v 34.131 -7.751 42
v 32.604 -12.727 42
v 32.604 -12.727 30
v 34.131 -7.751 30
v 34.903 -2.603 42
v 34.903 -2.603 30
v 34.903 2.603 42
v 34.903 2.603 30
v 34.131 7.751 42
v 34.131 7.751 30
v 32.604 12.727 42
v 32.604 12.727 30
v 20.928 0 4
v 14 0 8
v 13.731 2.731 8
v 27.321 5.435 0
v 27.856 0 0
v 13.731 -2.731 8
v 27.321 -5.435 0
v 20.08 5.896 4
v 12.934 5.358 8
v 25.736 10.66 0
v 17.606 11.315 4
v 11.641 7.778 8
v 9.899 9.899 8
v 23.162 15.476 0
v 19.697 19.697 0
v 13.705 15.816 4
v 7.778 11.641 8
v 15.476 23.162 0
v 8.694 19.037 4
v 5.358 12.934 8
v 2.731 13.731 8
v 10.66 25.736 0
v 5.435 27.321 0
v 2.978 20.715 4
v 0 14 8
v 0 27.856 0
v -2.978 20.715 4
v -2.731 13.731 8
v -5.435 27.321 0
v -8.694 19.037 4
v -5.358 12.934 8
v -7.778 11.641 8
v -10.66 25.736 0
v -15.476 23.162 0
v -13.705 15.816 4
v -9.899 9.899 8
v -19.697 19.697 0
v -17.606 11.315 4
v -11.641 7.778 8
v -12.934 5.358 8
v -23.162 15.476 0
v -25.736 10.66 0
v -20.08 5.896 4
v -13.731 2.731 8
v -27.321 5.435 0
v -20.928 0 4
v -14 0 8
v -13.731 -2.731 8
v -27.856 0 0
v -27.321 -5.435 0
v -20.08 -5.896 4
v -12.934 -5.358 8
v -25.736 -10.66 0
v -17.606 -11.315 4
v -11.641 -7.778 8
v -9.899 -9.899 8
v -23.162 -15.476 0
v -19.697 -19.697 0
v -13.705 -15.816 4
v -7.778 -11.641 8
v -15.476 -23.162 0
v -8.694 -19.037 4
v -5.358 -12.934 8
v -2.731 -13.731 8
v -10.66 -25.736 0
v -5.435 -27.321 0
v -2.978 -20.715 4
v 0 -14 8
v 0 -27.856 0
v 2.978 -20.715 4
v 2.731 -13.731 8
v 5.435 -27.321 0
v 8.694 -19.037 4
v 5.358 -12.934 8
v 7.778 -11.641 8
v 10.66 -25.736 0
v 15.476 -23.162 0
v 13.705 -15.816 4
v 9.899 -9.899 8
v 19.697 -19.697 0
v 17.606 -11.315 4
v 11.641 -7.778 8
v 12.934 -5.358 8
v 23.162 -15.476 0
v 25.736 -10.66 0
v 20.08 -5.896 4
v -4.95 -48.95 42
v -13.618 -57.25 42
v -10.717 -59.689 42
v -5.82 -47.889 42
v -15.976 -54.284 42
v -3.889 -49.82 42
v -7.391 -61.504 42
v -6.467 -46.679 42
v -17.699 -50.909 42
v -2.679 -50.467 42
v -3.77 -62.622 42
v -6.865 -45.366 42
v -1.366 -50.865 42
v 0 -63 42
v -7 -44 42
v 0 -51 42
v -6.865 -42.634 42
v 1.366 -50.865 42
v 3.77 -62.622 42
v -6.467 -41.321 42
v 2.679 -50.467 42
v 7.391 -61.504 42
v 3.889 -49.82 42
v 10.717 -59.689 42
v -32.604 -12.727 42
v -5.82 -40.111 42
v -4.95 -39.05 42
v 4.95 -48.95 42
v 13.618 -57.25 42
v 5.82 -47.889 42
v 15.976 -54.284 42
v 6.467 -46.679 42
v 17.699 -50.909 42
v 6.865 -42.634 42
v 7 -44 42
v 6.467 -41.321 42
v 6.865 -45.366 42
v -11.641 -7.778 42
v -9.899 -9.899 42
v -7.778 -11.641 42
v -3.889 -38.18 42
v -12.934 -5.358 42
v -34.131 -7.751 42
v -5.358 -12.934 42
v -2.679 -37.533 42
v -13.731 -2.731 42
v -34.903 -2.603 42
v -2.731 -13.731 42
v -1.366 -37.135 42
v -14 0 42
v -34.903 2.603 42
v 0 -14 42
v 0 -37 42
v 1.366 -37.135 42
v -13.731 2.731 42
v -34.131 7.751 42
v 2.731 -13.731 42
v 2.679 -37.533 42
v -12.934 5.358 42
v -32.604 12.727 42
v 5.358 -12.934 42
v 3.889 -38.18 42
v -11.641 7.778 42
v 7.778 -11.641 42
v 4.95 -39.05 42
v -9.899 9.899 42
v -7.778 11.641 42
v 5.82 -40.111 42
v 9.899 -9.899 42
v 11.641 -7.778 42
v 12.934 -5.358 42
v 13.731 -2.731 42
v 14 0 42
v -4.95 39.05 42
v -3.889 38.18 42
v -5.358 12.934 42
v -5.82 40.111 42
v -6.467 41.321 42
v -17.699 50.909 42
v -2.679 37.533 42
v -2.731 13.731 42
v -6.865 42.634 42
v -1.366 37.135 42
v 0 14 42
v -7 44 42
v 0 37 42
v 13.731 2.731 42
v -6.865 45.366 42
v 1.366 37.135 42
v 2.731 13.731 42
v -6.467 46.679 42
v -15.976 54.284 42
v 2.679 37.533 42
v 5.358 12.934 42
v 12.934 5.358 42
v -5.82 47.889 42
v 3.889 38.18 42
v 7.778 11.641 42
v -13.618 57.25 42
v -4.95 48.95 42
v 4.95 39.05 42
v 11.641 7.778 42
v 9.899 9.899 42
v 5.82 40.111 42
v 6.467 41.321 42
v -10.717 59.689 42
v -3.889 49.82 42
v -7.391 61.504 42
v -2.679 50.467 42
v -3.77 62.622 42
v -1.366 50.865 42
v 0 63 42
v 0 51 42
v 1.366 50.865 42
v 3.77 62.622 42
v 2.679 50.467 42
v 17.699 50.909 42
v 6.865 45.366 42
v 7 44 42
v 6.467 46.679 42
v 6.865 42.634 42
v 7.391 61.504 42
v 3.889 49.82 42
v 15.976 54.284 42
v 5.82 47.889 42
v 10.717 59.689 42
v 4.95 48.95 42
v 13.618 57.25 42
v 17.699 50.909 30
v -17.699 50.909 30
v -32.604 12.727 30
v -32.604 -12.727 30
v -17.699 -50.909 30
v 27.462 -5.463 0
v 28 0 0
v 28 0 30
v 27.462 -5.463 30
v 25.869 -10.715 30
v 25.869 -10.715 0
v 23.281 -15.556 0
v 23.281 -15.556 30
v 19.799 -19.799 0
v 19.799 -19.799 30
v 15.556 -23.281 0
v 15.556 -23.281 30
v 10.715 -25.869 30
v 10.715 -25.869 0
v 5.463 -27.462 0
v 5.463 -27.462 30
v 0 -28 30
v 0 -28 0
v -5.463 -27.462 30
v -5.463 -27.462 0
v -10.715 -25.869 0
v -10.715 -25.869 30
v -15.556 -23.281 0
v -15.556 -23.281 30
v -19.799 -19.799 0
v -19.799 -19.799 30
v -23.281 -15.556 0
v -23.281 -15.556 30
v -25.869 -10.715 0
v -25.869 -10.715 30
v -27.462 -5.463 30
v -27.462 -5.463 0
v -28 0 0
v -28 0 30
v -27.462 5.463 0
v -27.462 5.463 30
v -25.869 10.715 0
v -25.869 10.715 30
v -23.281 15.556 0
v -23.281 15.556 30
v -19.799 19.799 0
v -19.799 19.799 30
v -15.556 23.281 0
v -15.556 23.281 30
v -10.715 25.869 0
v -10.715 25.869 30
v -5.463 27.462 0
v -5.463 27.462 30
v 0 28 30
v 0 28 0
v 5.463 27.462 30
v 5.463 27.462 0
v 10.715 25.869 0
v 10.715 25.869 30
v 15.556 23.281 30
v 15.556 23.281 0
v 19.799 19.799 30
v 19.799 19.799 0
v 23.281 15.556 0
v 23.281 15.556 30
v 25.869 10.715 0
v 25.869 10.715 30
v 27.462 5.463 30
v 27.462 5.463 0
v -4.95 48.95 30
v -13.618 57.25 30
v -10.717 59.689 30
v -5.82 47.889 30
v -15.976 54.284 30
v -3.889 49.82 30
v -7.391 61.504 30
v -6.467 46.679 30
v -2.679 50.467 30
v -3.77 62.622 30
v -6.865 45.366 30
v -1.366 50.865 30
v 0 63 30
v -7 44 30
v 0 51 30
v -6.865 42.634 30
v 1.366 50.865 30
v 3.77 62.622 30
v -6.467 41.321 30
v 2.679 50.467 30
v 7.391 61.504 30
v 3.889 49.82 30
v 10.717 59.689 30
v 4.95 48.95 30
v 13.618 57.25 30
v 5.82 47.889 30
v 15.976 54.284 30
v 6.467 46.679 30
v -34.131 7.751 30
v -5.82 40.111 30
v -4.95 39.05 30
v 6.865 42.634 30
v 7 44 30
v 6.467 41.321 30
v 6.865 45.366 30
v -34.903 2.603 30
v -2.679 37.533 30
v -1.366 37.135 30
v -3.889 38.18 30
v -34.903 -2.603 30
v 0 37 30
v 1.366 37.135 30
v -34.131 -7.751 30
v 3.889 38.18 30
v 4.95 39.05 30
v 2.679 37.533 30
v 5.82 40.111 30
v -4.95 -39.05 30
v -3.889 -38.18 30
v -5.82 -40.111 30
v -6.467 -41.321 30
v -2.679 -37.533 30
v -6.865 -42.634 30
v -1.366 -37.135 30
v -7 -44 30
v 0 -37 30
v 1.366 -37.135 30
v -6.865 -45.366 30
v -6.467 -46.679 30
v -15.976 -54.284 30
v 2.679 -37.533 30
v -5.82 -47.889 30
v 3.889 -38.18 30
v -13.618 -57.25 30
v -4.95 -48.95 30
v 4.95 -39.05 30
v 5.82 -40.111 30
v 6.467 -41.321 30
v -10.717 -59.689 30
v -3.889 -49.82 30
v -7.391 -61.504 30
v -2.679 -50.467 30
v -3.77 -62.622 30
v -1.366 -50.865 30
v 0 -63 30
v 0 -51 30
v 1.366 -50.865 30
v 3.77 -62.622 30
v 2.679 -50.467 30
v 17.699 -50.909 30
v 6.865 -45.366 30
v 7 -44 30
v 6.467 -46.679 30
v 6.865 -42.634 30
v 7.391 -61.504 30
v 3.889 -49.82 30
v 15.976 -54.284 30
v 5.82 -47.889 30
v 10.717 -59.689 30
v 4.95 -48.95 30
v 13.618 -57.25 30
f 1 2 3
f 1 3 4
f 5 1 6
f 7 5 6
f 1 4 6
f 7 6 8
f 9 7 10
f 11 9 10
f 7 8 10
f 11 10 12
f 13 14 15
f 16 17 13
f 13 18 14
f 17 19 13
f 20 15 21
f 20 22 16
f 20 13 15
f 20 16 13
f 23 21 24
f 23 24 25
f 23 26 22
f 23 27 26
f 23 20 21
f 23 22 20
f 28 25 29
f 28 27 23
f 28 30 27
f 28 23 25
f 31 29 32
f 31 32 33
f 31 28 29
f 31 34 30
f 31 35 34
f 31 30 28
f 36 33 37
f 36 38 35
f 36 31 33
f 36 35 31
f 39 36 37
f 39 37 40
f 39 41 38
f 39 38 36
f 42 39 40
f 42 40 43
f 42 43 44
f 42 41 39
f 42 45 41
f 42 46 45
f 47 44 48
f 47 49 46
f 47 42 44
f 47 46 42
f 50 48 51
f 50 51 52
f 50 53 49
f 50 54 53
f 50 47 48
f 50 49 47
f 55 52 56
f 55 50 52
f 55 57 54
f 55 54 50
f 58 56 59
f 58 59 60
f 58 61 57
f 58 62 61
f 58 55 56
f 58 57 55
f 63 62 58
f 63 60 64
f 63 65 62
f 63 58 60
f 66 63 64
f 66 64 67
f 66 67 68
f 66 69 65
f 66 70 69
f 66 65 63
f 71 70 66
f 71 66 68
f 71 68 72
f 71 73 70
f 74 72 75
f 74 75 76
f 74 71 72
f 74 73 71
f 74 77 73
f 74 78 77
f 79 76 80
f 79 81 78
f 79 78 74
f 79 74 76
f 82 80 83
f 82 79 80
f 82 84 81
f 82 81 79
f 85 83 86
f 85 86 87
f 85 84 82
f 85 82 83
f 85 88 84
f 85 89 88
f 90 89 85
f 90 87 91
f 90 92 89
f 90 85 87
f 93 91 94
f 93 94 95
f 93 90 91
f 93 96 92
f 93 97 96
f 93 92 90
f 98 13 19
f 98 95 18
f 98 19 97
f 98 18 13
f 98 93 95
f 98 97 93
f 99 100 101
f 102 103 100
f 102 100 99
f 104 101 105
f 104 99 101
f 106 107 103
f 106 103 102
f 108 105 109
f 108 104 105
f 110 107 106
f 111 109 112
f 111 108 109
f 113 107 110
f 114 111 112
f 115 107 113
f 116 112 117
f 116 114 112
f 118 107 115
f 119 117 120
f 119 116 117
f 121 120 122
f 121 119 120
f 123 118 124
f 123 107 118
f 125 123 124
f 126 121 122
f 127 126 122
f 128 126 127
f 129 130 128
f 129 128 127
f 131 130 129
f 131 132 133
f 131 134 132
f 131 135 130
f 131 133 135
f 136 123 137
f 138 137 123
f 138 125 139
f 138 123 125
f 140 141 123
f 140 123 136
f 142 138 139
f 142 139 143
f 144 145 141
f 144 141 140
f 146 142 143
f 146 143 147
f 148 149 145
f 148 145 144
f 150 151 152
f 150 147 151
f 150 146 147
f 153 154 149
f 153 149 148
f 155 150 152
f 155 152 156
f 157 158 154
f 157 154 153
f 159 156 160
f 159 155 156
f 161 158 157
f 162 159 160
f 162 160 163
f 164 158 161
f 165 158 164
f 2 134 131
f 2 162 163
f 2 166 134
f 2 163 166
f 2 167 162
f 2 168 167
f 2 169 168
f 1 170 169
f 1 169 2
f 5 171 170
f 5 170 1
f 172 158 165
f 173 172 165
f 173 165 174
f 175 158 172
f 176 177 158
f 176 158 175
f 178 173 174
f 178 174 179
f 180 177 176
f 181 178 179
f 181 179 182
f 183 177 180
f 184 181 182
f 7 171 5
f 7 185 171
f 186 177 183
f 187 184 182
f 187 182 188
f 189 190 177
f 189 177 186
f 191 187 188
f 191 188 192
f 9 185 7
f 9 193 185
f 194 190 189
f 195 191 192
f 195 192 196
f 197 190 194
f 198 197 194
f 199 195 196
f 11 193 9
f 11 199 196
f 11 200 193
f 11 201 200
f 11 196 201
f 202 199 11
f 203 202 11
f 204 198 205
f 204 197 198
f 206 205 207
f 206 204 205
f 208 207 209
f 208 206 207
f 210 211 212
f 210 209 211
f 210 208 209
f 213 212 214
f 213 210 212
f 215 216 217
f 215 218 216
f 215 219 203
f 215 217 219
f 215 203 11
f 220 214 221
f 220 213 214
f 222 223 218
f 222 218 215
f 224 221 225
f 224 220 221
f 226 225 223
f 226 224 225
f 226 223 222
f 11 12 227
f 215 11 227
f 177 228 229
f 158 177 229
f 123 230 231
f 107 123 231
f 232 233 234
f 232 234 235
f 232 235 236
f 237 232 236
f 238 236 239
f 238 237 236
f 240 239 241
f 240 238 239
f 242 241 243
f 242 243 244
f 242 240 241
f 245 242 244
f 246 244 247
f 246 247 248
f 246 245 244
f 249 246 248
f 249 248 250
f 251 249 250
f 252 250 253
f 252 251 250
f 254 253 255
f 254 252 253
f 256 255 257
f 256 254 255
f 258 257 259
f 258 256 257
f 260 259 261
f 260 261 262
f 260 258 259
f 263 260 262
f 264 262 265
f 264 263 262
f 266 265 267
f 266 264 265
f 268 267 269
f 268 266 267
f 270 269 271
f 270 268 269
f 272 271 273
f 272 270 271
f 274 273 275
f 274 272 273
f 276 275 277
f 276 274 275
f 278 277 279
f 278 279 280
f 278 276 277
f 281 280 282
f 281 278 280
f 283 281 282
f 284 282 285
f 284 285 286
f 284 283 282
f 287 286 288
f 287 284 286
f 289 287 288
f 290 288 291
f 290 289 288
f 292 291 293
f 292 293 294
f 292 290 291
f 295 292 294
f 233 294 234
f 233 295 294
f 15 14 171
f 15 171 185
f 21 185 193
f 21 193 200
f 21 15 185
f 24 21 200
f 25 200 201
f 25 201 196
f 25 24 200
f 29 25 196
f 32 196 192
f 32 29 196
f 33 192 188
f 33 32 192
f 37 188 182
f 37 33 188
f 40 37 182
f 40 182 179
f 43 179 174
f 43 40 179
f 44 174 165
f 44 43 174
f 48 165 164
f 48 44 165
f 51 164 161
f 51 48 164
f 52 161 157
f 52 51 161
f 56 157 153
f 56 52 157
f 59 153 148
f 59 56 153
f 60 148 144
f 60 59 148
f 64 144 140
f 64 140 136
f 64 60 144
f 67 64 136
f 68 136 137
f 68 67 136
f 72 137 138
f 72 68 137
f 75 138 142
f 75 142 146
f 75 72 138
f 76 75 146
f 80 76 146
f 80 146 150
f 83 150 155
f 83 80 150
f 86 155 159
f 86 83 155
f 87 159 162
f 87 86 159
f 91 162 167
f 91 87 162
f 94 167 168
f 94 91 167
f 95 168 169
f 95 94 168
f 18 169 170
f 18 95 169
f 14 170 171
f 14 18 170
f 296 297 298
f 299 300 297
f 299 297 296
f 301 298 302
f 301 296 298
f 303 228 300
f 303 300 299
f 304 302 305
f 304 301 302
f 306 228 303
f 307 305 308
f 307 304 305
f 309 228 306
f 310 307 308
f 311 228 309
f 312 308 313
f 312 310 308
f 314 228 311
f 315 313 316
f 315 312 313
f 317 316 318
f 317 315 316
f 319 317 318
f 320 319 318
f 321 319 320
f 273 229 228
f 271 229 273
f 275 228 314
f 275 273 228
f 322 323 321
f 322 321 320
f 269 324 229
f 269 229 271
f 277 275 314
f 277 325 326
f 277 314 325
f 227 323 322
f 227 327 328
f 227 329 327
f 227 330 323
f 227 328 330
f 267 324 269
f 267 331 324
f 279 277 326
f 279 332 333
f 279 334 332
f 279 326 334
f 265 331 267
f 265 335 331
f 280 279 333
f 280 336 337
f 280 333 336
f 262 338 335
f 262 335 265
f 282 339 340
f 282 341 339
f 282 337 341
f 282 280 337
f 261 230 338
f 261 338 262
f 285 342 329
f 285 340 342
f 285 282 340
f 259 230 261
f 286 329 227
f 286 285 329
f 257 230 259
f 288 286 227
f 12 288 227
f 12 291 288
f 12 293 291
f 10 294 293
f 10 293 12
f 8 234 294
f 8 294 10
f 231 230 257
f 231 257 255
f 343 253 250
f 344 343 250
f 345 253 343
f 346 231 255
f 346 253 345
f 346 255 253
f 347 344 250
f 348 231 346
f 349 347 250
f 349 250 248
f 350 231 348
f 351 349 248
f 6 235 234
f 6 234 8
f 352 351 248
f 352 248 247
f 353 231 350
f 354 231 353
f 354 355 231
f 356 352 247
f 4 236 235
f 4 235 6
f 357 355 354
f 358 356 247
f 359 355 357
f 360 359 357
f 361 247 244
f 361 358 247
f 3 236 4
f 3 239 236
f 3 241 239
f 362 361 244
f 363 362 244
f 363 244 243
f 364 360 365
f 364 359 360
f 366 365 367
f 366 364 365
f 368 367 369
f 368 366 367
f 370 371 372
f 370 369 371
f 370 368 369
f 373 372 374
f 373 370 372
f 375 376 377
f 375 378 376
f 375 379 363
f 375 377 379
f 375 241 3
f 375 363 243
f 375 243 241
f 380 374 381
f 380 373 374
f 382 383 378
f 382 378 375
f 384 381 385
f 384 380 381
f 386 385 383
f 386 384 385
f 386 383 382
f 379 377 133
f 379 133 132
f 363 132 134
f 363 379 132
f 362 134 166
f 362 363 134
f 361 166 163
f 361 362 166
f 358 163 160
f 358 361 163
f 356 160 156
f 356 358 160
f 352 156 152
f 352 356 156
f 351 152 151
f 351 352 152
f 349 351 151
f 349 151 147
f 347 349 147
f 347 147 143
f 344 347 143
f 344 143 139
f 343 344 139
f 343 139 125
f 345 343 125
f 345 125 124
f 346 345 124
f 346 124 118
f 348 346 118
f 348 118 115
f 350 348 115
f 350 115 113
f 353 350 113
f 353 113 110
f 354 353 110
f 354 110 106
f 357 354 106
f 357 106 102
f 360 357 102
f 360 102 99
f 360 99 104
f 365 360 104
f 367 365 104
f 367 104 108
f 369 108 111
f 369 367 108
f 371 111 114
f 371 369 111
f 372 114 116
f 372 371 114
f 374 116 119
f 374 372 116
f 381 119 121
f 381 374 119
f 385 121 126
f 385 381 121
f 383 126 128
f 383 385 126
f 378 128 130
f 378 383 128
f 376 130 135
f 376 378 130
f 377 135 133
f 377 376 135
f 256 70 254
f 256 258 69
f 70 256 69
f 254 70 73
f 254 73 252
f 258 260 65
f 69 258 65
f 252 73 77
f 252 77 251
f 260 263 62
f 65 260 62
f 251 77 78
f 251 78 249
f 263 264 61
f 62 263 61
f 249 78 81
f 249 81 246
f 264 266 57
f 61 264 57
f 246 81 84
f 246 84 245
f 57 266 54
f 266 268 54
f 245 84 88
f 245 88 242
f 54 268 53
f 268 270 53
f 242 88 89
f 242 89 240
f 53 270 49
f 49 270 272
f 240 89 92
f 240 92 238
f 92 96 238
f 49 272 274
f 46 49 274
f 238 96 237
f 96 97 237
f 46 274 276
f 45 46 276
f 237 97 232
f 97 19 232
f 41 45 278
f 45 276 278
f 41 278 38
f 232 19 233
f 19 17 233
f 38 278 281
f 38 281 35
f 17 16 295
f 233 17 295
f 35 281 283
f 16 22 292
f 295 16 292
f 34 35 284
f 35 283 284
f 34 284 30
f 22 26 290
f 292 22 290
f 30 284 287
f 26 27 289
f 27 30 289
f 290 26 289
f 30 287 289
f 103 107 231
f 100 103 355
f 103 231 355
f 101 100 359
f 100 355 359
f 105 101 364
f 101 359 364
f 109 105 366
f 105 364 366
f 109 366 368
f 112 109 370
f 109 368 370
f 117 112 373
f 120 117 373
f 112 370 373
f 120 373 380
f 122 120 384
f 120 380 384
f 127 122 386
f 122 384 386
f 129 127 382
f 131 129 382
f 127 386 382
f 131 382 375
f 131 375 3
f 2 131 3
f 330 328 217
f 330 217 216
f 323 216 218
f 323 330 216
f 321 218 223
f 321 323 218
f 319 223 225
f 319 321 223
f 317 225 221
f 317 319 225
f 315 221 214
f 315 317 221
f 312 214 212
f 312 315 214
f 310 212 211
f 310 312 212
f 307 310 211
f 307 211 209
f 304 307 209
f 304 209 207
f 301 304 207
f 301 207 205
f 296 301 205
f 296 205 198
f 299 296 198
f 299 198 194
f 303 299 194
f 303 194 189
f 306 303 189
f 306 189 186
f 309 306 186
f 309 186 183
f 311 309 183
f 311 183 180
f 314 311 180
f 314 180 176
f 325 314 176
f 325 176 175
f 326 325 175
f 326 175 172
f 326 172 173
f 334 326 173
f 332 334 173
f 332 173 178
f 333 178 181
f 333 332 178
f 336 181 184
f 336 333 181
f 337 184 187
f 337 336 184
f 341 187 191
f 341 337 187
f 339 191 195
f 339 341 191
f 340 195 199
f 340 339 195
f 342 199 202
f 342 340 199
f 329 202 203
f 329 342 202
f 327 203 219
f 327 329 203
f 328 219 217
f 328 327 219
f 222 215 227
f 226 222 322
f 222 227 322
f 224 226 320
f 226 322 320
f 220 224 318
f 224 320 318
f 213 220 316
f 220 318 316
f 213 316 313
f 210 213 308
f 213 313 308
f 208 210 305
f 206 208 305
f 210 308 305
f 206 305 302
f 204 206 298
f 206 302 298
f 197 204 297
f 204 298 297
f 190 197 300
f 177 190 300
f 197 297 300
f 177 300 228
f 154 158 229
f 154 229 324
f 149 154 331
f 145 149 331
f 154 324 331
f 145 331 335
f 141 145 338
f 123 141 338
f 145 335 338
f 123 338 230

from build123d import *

# Parameters (mm, degrees)
F0_R     = 7
F0_R_2   = 14
F1_DEPTH = 42
F2_R     = 7
F2_R_2   = 28
F3_DEPTH = 30
F4_SIZE2 = 13.856406
F4_SIZE  = 8


with BuildPart() as f1:
    # F0 (on Top) → F1 (new body)
    with BuildSketch(Plane.XY):
        with BuildLine():
            Line((32.603934, 12.727273), (17.699279, 50.909091))
            ThreePointArc((17.699279, 50.909091), (0, 63), (-17.699279, 50.909091))
            Line((-17.699279, 50.909091), (-32.603934, 12.727273))
            ThreePointArc((-32.603934, 12.727273), (-35, 0), (-32.603934, -12.727273))
            Line((-32.603934, -12.727273), (-17.699279, -50.909091))
            ThreePointArc((-17.699279, -50.909091), (0, -63), (17.699279, -50.909091))
            Line((17.699279, -50.909091), (32.603934, -12.727273))
            ThreePointArc((32.603934, -12.727273), (35, 0), (32.603934, 12.727273))
        make_face()
        with Locations((0, -44)):
            Circle(F0_R, mode=Mode.SUBTRACT)
        Circle(F0_R_2, mode=Mode.SUBTRACT)
        with Locations((0, 44)):
            Circle(F0_R, mode=Mode.SUBTRACT)
    extrude(amount=F1_DEPTH)

    # F2 (on face) → F3 (cut)
    with BuildSketch(Plane(origin=(0, 0, 0), x_dir=(1, 0, 0), z_dir=(0, 0, -1))):
        with BuildLine():
            ThreePointArc((-17.699279, -50.909091), (0, -63), (17.699279, -50.909091))
            Line((17.699279, -50.909091), (32.603934, -12.727273))
            ThreePointArc((32.603934, -12.727273), (35, 0), (32.603934, 12.727273))
            Line((32.603934, 12.727273), (17.699279, 50.909091))
            ThreePointArc((17.699279, 50.909091), (0, 63), (-17.699279, 50.909091))
            Line((-17.699279, 50.909091), (-32.603934, 12.727273))
            ThreePointArc((-32.603934, 12.727273), (-35, 0), (-32.603934, -12.727273))
            Line((-32.603934, -12.727273), (-17.699279, -50.909091))
        make_face()
        with Locations((0, -44)):
            Circle(F2_R, mode=Mode.SUBTRACT)
        Circle(F2_R_2, mode=Mode.SUBTRACT)
        with Locations((0, 44)):
            Circle(F2_R, mode=Mode.SUBTRACT)
    extrude(amount=-F3_DEPTH, mode=Mode.SUBTRACT)

    # F4
    f4_edges = [f1.edges().sort_by_distance(p)[0] for p in [
        (-14, 0, 0),
    ]]
    chamfer(f4_edges, length=F4_SIZE, length2=F4_SIZE2)


solid = f1.part
